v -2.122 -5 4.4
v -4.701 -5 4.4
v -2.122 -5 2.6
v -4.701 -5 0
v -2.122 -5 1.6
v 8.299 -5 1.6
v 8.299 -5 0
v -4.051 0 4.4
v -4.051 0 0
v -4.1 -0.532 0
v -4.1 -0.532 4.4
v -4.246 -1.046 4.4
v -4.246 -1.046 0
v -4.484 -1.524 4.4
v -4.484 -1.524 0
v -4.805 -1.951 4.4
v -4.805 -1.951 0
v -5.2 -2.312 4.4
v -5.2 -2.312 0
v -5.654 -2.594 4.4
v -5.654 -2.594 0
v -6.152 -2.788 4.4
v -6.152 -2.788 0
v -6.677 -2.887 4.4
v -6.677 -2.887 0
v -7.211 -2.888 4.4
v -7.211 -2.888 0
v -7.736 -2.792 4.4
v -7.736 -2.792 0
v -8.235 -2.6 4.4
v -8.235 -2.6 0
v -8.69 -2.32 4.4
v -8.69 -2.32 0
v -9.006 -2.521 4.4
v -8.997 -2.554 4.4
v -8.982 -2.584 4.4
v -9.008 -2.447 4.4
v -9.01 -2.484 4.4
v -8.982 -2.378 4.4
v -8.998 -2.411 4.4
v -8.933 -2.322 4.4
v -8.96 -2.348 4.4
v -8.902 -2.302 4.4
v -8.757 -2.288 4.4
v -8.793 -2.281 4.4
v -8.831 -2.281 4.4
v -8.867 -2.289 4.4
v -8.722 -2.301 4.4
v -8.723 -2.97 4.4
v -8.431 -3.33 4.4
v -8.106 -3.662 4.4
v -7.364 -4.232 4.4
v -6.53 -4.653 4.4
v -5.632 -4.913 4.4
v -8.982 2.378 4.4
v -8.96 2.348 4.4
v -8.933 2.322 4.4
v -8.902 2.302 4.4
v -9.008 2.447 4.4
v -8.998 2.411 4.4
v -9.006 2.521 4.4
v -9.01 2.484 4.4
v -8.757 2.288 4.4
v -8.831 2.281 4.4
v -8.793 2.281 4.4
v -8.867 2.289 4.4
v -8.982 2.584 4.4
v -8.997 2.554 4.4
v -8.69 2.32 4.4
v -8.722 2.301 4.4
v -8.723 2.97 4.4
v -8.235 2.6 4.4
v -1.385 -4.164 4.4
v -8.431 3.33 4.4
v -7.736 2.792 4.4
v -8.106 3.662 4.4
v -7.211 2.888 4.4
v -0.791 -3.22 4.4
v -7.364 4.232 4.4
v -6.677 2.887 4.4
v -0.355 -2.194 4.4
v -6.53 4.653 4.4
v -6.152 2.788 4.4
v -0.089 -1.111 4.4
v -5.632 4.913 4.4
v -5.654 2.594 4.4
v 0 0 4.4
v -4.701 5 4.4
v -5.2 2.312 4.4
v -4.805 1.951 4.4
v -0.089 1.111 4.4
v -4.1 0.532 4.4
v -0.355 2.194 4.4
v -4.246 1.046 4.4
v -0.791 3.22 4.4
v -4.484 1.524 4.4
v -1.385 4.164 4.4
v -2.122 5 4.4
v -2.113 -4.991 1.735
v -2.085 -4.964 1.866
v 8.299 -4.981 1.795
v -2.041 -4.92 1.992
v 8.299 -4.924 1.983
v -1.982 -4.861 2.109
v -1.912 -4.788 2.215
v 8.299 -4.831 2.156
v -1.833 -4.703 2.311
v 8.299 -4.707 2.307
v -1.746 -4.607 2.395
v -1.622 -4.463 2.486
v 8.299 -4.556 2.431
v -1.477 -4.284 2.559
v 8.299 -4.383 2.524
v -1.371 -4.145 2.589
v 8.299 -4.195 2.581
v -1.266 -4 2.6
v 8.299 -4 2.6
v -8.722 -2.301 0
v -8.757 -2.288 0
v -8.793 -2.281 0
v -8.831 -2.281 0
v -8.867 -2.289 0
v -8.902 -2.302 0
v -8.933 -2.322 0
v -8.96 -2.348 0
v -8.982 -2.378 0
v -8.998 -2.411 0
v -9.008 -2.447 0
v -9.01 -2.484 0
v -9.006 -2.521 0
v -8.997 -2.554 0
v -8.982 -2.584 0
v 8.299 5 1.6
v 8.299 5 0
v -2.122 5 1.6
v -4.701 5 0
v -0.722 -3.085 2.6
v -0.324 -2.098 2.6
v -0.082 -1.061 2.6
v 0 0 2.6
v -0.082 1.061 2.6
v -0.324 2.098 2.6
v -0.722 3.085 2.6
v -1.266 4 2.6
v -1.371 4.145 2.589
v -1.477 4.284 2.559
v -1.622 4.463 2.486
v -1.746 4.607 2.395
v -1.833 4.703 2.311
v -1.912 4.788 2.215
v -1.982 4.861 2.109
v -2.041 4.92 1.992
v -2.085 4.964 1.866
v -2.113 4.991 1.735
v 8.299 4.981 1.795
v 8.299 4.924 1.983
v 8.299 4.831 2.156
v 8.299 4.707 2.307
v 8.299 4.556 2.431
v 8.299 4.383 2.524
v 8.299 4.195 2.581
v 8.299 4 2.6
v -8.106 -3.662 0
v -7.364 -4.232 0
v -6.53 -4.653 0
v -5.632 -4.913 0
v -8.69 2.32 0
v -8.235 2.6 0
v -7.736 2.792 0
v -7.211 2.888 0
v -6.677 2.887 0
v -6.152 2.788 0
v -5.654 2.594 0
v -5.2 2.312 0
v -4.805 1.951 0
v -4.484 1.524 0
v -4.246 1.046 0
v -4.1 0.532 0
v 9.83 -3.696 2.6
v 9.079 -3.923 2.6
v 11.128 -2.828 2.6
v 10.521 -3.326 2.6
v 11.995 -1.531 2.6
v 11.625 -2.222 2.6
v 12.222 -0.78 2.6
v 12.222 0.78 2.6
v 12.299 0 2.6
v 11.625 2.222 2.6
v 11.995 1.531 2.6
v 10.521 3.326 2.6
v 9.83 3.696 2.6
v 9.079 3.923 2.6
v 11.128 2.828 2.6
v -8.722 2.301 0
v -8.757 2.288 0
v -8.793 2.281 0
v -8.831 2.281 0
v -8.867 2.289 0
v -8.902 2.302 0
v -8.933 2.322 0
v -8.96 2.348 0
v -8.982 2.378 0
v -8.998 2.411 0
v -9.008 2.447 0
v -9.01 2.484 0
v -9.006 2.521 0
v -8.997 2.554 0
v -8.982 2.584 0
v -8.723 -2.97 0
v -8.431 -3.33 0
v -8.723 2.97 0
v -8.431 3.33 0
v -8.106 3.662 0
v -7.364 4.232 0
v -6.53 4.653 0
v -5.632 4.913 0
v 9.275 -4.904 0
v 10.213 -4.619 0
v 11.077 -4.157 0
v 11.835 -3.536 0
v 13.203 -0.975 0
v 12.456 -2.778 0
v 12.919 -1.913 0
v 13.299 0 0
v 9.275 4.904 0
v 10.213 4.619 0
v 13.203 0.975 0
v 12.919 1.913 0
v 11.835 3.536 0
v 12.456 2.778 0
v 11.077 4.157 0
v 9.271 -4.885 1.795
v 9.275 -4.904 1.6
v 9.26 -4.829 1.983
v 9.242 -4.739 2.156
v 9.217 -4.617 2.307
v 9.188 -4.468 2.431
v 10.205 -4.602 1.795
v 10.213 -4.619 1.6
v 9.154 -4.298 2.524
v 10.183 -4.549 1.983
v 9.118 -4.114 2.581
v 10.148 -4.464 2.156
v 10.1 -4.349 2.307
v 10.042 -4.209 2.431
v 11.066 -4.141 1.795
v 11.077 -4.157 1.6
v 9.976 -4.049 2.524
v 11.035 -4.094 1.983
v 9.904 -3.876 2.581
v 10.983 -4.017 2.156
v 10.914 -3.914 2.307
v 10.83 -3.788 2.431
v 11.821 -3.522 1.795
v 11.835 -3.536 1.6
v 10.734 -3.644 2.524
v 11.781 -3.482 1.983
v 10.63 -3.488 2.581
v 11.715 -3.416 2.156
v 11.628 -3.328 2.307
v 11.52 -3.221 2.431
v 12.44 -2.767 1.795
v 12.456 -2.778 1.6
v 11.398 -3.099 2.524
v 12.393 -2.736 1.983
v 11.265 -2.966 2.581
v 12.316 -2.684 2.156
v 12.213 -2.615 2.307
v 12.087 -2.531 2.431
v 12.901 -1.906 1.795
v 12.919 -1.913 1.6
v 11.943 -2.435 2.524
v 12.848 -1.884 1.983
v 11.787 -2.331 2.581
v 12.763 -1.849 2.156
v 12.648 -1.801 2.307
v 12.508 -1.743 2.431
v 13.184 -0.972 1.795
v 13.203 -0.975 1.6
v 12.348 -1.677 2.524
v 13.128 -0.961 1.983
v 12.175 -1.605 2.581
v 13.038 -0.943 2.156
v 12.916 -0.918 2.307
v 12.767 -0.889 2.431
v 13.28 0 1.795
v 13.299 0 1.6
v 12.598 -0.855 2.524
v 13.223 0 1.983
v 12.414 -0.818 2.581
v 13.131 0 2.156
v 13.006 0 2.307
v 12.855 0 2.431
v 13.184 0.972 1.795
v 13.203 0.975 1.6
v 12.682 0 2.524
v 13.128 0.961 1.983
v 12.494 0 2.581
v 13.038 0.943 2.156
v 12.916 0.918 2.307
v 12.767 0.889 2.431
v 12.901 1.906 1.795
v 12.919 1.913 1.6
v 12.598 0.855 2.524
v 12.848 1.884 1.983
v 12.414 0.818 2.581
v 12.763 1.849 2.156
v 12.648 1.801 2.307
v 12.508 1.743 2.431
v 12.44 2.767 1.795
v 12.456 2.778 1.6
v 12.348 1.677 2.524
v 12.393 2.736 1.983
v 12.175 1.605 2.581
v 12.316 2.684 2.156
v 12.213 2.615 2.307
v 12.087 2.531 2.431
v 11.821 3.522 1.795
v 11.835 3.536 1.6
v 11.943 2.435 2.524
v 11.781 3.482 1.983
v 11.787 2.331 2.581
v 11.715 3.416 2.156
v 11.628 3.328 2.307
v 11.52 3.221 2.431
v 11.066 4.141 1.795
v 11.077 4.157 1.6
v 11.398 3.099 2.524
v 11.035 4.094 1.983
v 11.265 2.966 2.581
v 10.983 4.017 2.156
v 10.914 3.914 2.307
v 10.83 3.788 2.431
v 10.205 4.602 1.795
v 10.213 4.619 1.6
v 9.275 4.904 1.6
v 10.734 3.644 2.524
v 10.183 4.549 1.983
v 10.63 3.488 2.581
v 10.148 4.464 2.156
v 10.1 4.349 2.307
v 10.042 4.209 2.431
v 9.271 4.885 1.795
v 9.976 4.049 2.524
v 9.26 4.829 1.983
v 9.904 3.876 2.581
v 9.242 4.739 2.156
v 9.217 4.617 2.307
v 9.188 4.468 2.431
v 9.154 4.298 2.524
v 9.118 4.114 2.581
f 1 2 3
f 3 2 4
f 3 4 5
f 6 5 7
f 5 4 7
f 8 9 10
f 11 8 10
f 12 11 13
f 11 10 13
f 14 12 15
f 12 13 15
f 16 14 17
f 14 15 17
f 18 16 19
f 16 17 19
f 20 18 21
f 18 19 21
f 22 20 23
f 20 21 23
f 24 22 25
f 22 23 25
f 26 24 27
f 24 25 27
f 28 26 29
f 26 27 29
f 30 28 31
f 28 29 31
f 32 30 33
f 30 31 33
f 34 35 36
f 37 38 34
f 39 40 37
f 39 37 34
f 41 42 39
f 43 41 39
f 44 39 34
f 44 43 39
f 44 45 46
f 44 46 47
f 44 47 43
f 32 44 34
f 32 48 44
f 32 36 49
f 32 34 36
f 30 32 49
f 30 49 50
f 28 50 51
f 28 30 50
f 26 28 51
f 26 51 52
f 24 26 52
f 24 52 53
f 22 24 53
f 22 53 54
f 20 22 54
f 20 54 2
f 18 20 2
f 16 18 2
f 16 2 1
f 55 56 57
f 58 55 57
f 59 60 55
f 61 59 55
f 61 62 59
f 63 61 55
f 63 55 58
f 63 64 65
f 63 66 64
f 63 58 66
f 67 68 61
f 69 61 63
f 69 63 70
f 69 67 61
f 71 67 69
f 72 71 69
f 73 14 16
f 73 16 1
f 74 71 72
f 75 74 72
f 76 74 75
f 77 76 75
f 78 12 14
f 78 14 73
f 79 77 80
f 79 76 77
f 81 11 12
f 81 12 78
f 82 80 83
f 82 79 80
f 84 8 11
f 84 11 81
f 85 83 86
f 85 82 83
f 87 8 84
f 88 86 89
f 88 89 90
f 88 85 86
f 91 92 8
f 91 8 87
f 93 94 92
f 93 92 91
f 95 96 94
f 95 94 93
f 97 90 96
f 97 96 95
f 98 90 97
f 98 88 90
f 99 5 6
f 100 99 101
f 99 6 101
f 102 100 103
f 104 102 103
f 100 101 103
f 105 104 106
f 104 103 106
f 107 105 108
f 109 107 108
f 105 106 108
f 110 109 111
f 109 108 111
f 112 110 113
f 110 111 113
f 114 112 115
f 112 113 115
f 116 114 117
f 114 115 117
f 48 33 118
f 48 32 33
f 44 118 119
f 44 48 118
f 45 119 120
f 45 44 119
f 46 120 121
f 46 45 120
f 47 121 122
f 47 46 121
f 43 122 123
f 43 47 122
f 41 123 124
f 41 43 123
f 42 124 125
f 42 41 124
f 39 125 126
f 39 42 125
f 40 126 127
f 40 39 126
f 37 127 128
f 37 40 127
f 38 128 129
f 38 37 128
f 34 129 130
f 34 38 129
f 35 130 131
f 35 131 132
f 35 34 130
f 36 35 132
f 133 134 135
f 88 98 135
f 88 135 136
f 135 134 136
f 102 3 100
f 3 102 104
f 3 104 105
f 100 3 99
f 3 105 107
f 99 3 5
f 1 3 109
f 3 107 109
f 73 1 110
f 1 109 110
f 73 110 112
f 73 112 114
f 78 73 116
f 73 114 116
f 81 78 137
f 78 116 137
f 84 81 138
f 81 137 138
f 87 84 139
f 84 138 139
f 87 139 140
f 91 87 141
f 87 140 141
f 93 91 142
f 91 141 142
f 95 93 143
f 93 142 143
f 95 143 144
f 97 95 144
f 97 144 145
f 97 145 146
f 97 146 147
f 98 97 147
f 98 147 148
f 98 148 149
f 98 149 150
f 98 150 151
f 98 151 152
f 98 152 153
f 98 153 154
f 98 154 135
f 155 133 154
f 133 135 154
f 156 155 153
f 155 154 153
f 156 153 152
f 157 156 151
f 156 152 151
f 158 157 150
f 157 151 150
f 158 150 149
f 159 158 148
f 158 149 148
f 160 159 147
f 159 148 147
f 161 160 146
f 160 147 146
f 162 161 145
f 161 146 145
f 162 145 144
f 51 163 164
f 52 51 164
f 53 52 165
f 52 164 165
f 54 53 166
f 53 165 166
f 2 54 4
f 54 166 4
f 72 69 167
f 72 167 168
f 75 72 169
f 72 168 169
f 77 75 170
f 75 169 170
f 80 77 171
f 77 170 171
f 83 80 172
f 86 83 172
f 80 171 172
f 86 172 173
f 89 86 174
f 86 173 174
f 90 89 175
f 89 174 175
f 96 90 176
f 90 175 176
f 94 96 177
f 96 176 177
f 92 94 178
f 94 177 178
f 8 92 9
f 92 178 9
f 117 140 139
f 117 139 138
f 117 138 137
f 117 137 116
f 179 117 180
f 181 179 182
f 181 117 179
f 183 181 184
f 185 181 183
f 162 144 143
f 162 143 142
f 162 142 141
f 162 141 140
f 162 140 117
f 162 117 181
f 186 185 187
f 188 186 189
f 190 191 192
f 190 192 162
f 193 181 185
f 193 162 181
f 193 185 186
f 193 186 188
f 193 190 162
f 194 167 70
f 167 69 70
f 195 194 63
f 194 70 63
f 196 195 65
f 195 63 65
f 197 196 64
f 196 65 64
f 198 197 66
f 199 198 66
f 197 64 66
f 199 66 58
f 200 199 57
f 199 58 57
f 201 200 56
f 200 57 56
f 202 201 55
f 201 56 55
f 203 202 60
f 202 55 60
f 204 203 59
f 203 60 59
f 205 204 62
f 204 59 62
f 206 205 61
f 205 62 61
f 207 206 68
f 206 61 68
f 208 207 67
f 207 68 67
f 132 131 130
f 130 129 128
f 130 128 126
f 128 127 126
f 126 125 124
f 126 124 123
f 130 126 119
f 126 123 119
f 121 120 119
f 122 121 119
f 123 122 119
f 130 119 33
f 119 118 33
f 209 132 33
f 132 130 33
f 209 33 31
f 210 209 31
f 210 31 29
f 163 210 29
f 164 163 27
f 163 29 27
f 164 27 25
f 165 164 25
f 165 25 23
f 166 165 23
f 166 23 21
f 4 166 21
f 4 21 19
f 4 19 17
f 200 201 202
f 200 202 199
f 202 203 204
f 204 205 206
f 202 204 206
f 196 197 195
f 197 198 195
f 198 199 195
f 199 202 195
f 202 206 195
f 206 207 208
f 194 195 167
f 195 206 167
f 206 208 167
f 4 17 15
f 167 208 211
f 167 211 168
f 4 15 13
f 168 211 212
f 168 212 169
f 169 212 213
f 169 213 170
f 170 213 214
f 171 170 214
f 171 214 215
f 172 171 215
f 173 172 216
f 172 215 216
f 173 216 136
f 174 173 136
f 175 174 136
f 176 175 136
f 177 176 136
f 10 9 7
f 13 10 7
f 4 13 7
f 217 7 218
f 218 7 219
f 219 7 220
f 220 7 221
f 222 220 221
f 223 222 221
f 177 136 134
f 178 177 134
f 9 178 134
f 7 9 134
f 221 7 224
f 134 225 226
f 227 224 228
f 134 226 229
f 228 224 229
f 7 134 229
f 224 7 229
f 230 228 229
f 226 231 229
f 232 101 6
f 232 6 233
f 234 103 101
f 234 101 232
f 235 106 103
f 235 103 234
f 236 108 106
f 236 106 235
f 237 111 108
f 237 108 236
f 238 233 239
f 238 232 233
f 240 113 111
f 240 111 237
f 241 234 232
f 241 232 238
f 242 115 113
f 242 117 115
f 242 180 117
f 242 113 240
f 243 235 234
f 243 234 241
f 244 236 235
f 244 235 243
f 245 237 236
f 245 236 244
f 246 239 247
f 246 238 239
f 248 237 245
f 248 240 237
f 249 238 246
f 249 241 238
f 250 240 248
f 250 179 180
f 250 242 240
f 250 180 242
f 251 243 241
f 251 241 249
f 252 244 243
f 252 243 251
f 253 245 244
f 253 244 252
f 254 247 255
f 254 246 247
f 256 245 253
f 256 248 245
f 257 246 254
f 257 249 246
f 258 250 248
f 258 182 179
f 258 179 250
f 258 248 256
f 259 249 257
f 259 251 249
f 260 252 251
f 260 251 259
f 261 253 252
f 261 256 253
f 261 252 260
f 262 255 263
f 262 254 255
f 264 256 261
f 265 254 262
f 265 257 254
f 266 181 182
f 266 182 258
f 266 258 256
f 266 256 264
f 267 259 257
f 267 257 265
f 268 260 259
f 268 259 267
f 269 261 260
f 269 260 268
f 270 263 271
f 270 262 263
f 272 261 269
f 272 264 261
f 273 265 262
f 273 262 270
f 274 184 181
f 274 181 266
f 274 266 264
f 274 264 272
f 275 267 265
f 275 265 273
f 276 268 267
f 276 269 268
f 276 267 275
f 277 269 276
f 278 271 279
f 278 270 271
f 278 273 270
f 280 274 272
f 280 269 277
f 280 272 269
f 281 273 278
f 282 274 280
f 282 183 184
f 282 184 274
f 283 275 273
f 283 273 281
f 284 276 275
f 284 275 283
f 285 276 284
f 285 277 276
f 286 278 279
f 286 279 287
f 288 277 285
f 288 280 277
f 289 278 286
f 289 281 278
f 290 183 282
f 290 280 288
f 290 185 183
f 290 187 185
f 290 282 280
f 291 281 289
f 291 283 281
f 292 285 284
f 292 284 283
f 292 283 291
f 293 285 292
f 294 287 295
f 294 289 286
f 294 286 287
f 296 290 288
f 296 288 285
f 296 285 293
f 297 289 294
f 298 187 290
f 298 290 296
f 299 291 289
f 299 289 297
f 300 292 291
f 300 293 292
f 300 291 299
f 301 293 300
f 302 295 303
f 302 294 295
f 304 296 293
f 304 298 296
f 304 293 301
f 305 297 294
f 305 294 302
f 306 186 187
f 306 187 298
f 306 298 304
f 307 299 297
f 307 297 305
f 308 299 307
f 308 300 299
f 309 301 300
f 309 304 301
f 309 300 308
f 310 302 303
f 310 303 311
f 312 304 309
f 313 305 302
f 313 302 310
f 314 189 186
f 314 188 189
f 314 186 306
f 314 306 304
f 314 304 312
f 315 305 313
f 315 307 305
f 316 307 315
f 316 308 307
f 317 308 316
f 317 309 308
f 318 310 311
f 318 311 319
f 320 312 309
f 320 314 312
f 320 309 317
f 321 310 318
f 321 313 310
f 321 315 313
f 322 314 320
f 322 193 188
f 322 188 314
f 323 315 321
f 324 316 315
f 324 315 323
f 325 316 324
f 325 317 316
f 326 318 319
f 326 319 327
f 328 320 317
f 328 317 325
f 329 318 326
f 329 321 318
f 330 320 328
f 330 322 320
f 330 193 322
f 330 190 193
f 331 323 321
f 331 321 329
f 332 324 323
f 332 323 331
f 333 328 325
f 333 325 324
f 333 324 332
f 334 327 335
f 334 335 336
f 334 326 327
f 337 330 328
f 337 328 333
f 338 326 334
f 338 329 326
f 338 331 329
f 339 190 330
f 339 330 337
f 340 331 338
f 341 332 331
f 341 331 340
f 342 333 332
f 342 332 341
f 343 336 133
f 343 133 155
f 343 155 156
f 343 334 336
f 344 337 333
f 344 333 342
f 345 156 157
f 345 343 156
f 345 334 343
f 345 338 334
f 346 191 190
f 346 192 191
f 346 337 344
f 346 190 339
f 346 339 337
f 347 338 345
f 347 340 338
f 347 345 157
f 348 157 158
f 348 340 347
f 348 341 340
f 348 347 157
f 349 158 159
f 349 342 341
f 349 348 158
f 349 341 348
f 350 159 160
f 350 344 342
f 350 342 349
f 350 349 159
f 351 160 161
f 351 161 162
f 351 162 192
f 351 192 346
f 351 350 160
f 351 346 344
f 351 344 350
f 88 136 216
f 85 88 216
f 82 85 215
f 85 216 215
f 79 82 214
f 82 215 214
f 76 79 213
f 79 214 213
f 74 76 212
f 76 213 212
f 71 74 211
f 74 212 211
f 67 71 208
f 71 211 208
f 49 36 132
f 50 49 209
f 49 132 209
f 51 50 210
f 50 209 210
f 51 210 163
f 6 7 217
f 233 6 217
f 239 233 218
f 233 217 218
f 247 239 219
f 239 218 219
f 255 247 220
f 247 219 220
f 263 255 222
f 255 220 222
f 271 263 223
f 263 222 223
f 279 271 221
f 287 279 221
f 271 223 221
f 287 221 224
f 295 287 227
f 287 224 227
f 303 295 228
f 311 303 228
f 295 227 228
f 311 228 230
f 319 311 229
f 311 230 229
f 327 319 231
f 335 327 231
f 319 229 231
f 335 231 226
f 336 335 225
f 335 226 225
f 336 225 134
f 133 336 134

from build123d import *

# Parameters (mm, degrees)
BOSS_EXTRUDE7_DEPTH  = 2.5
BOSS_EXTRUDE8_DEPTH  = 4.4
FILLET1_R            = 0.2
FILLET2_R            = 0.2
BOSS_EXTRUDE9_DEPTH  = 4.4
BOSS_EXTRUDE10_DEPTH = 2.6
FILLET3_R            = 1


with BuildPart() as part:
    # Sketch1 → Boss-Extrude7 (new body)
    with BuildSketch(Plane.XY):
        with BuildLine():
            ThreePointArc((-8.105508314, 3.661777672), (-4.68058624, 3.096358858), (-3.111398084, 0))
            Line((-3.111398084, 0), (0, 0))
            ThreePointArc((0, 0), (-0.552546694, 2.715894232), (-2.12233973, 5))
            Line((-2.12233973, 5), (-4.700896107, 5))
            ThreePointArc((-4.700896107, 5), (-6.529982168, 4.65343359), (-8.105508314, 3.661777672))
        make_face()
    extrude(amount=BOSS_EXTRUDE7_DEPTH)

    # Sketch1_7 → Boss-Extrude8 (add)
    with BuildSketch(Plane.XY):
        with BuildLine():
            ThreePointArc((-9.512562774, 1.359361574), (-6.250479564, 2.814145815), (-4.050896107, 0))
            Line((-4.050896107, 0), (-3.111398084, 0))
            ThreePointArc((-3.111398084, 0), (-4.68058624, 3.096358858), (-8.105508314, 3.661777672))
            ThreePointArc((-8.105508314, 3.661777672), (-8.967286807, 2.607280268), (-9.512562774, 1.359361574))
        make_face()
        with BuildLine():
            Line((-3.111398084, 0), (-4.050896107, 0))
            ThreePointArc((-4.050896107, 0), (-6.250479564, -2.814145815), (-9.512562774, -1.359361574))
            ThreePointArc((-9.512562774, -1.359361574), (-8.967286807, -2.607280268), (-8.105508314, -3.661777672))
            ThreePointArc((-8.105508314, -3.661777672), (-4.68058624, -3.096358858), (-3.111398084, 0))
        make_face()
    extrude(amount=BOSS_EXTRUDE8_DEPTH)

    # Fillet1
    fillet1_edges = [part.edges().sort_by_distance(p)[0] for p in [
        (-9.512562774, -1.359361574, 2.2),
    ]]
    fillet(fillet1_edges, radius=FILLET1_R)

    # Fillet2
    fillet2_edges = [part.edges().sort_by_distance(p)[0] for p in [
        (-9.512562774, 1.359361574, 2.2),
    ]]
    fillet(fillet2_edges, radius=FILLET2_R)

    # Sketch1_8 → Boss-Extrude9 (add)
    with BuildSketch(Plane.XY):
        with BuildLine():
            ThreePointArc((-8.105508314, 3.661777672), (-4.68058624, 3.096358858), (-3.111398084, 0))
            Line((-3.111398084, 0), (0, 0))
            ThreePointArc((0, 0), (-0.552546694, 2.715894232), (-2.12233973, 5))
            Line((-2.12233973, 5), (-4.700896107, 5))
            ThreePointArc((-4.700896107, 5), (-6.529982168, 4.65343359), (-8.105508314, 3.661777672))
        make_face()
        with BuildLine():
            Line((0, 0), (-3.111398084, 0))
            ThreePointArc((-3.111398084, 0), (-4.68058624, -3.096358858), (-8.105508314, -3.661777672))
            ThreePointArc((-8.105508314, -3.661777672), (-6.529982168, -4.65343359), (-4.700896107, -5))
            Line((-4.700896107, -5), (-2.12233973, -5))
            ThreePointArc((-2.12233973, -5), (-0.552546694, -2.715894232), (0, 0))
        make_face()
    extrude(amount=BOSS_EXTRUDE9_DEPTH)

    # Sketch1_12 → Boss-Extrude10 (add)
    with BuildSketch(Plane.XY):
        with BuildLine():
            Line((8.299103893, 5), (-2.12233973, 5))
            ThreePointArc((-2.12233973, 5), (-0.552546694, 2.715894232), (0, 0))
            ThreePointArc((0, 0), (-0.552546694, -2.715894232), (-2.12233973, -5))
            Line((-2.12233973, -5), (8.299103893, -5))
            ThreePointArc((8.299103893, -5), (13.299103893, 0), (8.299103893, 5))
        make_face()
    extrude(amount=BOSS_EXTRUDE10_DEPTH)

    # Fillet3
    fillet3_edges = [part.edges().sort_by_distance(p)[0] for p in [
        (3.088382082, 5, 2.6),
        (3.088382082, -5, 2.6),
        (13.299103893, 0, 2.6),
    ]]
    fillet(fillet3_edges, radius=FILLET3_R)


solid = part.part
